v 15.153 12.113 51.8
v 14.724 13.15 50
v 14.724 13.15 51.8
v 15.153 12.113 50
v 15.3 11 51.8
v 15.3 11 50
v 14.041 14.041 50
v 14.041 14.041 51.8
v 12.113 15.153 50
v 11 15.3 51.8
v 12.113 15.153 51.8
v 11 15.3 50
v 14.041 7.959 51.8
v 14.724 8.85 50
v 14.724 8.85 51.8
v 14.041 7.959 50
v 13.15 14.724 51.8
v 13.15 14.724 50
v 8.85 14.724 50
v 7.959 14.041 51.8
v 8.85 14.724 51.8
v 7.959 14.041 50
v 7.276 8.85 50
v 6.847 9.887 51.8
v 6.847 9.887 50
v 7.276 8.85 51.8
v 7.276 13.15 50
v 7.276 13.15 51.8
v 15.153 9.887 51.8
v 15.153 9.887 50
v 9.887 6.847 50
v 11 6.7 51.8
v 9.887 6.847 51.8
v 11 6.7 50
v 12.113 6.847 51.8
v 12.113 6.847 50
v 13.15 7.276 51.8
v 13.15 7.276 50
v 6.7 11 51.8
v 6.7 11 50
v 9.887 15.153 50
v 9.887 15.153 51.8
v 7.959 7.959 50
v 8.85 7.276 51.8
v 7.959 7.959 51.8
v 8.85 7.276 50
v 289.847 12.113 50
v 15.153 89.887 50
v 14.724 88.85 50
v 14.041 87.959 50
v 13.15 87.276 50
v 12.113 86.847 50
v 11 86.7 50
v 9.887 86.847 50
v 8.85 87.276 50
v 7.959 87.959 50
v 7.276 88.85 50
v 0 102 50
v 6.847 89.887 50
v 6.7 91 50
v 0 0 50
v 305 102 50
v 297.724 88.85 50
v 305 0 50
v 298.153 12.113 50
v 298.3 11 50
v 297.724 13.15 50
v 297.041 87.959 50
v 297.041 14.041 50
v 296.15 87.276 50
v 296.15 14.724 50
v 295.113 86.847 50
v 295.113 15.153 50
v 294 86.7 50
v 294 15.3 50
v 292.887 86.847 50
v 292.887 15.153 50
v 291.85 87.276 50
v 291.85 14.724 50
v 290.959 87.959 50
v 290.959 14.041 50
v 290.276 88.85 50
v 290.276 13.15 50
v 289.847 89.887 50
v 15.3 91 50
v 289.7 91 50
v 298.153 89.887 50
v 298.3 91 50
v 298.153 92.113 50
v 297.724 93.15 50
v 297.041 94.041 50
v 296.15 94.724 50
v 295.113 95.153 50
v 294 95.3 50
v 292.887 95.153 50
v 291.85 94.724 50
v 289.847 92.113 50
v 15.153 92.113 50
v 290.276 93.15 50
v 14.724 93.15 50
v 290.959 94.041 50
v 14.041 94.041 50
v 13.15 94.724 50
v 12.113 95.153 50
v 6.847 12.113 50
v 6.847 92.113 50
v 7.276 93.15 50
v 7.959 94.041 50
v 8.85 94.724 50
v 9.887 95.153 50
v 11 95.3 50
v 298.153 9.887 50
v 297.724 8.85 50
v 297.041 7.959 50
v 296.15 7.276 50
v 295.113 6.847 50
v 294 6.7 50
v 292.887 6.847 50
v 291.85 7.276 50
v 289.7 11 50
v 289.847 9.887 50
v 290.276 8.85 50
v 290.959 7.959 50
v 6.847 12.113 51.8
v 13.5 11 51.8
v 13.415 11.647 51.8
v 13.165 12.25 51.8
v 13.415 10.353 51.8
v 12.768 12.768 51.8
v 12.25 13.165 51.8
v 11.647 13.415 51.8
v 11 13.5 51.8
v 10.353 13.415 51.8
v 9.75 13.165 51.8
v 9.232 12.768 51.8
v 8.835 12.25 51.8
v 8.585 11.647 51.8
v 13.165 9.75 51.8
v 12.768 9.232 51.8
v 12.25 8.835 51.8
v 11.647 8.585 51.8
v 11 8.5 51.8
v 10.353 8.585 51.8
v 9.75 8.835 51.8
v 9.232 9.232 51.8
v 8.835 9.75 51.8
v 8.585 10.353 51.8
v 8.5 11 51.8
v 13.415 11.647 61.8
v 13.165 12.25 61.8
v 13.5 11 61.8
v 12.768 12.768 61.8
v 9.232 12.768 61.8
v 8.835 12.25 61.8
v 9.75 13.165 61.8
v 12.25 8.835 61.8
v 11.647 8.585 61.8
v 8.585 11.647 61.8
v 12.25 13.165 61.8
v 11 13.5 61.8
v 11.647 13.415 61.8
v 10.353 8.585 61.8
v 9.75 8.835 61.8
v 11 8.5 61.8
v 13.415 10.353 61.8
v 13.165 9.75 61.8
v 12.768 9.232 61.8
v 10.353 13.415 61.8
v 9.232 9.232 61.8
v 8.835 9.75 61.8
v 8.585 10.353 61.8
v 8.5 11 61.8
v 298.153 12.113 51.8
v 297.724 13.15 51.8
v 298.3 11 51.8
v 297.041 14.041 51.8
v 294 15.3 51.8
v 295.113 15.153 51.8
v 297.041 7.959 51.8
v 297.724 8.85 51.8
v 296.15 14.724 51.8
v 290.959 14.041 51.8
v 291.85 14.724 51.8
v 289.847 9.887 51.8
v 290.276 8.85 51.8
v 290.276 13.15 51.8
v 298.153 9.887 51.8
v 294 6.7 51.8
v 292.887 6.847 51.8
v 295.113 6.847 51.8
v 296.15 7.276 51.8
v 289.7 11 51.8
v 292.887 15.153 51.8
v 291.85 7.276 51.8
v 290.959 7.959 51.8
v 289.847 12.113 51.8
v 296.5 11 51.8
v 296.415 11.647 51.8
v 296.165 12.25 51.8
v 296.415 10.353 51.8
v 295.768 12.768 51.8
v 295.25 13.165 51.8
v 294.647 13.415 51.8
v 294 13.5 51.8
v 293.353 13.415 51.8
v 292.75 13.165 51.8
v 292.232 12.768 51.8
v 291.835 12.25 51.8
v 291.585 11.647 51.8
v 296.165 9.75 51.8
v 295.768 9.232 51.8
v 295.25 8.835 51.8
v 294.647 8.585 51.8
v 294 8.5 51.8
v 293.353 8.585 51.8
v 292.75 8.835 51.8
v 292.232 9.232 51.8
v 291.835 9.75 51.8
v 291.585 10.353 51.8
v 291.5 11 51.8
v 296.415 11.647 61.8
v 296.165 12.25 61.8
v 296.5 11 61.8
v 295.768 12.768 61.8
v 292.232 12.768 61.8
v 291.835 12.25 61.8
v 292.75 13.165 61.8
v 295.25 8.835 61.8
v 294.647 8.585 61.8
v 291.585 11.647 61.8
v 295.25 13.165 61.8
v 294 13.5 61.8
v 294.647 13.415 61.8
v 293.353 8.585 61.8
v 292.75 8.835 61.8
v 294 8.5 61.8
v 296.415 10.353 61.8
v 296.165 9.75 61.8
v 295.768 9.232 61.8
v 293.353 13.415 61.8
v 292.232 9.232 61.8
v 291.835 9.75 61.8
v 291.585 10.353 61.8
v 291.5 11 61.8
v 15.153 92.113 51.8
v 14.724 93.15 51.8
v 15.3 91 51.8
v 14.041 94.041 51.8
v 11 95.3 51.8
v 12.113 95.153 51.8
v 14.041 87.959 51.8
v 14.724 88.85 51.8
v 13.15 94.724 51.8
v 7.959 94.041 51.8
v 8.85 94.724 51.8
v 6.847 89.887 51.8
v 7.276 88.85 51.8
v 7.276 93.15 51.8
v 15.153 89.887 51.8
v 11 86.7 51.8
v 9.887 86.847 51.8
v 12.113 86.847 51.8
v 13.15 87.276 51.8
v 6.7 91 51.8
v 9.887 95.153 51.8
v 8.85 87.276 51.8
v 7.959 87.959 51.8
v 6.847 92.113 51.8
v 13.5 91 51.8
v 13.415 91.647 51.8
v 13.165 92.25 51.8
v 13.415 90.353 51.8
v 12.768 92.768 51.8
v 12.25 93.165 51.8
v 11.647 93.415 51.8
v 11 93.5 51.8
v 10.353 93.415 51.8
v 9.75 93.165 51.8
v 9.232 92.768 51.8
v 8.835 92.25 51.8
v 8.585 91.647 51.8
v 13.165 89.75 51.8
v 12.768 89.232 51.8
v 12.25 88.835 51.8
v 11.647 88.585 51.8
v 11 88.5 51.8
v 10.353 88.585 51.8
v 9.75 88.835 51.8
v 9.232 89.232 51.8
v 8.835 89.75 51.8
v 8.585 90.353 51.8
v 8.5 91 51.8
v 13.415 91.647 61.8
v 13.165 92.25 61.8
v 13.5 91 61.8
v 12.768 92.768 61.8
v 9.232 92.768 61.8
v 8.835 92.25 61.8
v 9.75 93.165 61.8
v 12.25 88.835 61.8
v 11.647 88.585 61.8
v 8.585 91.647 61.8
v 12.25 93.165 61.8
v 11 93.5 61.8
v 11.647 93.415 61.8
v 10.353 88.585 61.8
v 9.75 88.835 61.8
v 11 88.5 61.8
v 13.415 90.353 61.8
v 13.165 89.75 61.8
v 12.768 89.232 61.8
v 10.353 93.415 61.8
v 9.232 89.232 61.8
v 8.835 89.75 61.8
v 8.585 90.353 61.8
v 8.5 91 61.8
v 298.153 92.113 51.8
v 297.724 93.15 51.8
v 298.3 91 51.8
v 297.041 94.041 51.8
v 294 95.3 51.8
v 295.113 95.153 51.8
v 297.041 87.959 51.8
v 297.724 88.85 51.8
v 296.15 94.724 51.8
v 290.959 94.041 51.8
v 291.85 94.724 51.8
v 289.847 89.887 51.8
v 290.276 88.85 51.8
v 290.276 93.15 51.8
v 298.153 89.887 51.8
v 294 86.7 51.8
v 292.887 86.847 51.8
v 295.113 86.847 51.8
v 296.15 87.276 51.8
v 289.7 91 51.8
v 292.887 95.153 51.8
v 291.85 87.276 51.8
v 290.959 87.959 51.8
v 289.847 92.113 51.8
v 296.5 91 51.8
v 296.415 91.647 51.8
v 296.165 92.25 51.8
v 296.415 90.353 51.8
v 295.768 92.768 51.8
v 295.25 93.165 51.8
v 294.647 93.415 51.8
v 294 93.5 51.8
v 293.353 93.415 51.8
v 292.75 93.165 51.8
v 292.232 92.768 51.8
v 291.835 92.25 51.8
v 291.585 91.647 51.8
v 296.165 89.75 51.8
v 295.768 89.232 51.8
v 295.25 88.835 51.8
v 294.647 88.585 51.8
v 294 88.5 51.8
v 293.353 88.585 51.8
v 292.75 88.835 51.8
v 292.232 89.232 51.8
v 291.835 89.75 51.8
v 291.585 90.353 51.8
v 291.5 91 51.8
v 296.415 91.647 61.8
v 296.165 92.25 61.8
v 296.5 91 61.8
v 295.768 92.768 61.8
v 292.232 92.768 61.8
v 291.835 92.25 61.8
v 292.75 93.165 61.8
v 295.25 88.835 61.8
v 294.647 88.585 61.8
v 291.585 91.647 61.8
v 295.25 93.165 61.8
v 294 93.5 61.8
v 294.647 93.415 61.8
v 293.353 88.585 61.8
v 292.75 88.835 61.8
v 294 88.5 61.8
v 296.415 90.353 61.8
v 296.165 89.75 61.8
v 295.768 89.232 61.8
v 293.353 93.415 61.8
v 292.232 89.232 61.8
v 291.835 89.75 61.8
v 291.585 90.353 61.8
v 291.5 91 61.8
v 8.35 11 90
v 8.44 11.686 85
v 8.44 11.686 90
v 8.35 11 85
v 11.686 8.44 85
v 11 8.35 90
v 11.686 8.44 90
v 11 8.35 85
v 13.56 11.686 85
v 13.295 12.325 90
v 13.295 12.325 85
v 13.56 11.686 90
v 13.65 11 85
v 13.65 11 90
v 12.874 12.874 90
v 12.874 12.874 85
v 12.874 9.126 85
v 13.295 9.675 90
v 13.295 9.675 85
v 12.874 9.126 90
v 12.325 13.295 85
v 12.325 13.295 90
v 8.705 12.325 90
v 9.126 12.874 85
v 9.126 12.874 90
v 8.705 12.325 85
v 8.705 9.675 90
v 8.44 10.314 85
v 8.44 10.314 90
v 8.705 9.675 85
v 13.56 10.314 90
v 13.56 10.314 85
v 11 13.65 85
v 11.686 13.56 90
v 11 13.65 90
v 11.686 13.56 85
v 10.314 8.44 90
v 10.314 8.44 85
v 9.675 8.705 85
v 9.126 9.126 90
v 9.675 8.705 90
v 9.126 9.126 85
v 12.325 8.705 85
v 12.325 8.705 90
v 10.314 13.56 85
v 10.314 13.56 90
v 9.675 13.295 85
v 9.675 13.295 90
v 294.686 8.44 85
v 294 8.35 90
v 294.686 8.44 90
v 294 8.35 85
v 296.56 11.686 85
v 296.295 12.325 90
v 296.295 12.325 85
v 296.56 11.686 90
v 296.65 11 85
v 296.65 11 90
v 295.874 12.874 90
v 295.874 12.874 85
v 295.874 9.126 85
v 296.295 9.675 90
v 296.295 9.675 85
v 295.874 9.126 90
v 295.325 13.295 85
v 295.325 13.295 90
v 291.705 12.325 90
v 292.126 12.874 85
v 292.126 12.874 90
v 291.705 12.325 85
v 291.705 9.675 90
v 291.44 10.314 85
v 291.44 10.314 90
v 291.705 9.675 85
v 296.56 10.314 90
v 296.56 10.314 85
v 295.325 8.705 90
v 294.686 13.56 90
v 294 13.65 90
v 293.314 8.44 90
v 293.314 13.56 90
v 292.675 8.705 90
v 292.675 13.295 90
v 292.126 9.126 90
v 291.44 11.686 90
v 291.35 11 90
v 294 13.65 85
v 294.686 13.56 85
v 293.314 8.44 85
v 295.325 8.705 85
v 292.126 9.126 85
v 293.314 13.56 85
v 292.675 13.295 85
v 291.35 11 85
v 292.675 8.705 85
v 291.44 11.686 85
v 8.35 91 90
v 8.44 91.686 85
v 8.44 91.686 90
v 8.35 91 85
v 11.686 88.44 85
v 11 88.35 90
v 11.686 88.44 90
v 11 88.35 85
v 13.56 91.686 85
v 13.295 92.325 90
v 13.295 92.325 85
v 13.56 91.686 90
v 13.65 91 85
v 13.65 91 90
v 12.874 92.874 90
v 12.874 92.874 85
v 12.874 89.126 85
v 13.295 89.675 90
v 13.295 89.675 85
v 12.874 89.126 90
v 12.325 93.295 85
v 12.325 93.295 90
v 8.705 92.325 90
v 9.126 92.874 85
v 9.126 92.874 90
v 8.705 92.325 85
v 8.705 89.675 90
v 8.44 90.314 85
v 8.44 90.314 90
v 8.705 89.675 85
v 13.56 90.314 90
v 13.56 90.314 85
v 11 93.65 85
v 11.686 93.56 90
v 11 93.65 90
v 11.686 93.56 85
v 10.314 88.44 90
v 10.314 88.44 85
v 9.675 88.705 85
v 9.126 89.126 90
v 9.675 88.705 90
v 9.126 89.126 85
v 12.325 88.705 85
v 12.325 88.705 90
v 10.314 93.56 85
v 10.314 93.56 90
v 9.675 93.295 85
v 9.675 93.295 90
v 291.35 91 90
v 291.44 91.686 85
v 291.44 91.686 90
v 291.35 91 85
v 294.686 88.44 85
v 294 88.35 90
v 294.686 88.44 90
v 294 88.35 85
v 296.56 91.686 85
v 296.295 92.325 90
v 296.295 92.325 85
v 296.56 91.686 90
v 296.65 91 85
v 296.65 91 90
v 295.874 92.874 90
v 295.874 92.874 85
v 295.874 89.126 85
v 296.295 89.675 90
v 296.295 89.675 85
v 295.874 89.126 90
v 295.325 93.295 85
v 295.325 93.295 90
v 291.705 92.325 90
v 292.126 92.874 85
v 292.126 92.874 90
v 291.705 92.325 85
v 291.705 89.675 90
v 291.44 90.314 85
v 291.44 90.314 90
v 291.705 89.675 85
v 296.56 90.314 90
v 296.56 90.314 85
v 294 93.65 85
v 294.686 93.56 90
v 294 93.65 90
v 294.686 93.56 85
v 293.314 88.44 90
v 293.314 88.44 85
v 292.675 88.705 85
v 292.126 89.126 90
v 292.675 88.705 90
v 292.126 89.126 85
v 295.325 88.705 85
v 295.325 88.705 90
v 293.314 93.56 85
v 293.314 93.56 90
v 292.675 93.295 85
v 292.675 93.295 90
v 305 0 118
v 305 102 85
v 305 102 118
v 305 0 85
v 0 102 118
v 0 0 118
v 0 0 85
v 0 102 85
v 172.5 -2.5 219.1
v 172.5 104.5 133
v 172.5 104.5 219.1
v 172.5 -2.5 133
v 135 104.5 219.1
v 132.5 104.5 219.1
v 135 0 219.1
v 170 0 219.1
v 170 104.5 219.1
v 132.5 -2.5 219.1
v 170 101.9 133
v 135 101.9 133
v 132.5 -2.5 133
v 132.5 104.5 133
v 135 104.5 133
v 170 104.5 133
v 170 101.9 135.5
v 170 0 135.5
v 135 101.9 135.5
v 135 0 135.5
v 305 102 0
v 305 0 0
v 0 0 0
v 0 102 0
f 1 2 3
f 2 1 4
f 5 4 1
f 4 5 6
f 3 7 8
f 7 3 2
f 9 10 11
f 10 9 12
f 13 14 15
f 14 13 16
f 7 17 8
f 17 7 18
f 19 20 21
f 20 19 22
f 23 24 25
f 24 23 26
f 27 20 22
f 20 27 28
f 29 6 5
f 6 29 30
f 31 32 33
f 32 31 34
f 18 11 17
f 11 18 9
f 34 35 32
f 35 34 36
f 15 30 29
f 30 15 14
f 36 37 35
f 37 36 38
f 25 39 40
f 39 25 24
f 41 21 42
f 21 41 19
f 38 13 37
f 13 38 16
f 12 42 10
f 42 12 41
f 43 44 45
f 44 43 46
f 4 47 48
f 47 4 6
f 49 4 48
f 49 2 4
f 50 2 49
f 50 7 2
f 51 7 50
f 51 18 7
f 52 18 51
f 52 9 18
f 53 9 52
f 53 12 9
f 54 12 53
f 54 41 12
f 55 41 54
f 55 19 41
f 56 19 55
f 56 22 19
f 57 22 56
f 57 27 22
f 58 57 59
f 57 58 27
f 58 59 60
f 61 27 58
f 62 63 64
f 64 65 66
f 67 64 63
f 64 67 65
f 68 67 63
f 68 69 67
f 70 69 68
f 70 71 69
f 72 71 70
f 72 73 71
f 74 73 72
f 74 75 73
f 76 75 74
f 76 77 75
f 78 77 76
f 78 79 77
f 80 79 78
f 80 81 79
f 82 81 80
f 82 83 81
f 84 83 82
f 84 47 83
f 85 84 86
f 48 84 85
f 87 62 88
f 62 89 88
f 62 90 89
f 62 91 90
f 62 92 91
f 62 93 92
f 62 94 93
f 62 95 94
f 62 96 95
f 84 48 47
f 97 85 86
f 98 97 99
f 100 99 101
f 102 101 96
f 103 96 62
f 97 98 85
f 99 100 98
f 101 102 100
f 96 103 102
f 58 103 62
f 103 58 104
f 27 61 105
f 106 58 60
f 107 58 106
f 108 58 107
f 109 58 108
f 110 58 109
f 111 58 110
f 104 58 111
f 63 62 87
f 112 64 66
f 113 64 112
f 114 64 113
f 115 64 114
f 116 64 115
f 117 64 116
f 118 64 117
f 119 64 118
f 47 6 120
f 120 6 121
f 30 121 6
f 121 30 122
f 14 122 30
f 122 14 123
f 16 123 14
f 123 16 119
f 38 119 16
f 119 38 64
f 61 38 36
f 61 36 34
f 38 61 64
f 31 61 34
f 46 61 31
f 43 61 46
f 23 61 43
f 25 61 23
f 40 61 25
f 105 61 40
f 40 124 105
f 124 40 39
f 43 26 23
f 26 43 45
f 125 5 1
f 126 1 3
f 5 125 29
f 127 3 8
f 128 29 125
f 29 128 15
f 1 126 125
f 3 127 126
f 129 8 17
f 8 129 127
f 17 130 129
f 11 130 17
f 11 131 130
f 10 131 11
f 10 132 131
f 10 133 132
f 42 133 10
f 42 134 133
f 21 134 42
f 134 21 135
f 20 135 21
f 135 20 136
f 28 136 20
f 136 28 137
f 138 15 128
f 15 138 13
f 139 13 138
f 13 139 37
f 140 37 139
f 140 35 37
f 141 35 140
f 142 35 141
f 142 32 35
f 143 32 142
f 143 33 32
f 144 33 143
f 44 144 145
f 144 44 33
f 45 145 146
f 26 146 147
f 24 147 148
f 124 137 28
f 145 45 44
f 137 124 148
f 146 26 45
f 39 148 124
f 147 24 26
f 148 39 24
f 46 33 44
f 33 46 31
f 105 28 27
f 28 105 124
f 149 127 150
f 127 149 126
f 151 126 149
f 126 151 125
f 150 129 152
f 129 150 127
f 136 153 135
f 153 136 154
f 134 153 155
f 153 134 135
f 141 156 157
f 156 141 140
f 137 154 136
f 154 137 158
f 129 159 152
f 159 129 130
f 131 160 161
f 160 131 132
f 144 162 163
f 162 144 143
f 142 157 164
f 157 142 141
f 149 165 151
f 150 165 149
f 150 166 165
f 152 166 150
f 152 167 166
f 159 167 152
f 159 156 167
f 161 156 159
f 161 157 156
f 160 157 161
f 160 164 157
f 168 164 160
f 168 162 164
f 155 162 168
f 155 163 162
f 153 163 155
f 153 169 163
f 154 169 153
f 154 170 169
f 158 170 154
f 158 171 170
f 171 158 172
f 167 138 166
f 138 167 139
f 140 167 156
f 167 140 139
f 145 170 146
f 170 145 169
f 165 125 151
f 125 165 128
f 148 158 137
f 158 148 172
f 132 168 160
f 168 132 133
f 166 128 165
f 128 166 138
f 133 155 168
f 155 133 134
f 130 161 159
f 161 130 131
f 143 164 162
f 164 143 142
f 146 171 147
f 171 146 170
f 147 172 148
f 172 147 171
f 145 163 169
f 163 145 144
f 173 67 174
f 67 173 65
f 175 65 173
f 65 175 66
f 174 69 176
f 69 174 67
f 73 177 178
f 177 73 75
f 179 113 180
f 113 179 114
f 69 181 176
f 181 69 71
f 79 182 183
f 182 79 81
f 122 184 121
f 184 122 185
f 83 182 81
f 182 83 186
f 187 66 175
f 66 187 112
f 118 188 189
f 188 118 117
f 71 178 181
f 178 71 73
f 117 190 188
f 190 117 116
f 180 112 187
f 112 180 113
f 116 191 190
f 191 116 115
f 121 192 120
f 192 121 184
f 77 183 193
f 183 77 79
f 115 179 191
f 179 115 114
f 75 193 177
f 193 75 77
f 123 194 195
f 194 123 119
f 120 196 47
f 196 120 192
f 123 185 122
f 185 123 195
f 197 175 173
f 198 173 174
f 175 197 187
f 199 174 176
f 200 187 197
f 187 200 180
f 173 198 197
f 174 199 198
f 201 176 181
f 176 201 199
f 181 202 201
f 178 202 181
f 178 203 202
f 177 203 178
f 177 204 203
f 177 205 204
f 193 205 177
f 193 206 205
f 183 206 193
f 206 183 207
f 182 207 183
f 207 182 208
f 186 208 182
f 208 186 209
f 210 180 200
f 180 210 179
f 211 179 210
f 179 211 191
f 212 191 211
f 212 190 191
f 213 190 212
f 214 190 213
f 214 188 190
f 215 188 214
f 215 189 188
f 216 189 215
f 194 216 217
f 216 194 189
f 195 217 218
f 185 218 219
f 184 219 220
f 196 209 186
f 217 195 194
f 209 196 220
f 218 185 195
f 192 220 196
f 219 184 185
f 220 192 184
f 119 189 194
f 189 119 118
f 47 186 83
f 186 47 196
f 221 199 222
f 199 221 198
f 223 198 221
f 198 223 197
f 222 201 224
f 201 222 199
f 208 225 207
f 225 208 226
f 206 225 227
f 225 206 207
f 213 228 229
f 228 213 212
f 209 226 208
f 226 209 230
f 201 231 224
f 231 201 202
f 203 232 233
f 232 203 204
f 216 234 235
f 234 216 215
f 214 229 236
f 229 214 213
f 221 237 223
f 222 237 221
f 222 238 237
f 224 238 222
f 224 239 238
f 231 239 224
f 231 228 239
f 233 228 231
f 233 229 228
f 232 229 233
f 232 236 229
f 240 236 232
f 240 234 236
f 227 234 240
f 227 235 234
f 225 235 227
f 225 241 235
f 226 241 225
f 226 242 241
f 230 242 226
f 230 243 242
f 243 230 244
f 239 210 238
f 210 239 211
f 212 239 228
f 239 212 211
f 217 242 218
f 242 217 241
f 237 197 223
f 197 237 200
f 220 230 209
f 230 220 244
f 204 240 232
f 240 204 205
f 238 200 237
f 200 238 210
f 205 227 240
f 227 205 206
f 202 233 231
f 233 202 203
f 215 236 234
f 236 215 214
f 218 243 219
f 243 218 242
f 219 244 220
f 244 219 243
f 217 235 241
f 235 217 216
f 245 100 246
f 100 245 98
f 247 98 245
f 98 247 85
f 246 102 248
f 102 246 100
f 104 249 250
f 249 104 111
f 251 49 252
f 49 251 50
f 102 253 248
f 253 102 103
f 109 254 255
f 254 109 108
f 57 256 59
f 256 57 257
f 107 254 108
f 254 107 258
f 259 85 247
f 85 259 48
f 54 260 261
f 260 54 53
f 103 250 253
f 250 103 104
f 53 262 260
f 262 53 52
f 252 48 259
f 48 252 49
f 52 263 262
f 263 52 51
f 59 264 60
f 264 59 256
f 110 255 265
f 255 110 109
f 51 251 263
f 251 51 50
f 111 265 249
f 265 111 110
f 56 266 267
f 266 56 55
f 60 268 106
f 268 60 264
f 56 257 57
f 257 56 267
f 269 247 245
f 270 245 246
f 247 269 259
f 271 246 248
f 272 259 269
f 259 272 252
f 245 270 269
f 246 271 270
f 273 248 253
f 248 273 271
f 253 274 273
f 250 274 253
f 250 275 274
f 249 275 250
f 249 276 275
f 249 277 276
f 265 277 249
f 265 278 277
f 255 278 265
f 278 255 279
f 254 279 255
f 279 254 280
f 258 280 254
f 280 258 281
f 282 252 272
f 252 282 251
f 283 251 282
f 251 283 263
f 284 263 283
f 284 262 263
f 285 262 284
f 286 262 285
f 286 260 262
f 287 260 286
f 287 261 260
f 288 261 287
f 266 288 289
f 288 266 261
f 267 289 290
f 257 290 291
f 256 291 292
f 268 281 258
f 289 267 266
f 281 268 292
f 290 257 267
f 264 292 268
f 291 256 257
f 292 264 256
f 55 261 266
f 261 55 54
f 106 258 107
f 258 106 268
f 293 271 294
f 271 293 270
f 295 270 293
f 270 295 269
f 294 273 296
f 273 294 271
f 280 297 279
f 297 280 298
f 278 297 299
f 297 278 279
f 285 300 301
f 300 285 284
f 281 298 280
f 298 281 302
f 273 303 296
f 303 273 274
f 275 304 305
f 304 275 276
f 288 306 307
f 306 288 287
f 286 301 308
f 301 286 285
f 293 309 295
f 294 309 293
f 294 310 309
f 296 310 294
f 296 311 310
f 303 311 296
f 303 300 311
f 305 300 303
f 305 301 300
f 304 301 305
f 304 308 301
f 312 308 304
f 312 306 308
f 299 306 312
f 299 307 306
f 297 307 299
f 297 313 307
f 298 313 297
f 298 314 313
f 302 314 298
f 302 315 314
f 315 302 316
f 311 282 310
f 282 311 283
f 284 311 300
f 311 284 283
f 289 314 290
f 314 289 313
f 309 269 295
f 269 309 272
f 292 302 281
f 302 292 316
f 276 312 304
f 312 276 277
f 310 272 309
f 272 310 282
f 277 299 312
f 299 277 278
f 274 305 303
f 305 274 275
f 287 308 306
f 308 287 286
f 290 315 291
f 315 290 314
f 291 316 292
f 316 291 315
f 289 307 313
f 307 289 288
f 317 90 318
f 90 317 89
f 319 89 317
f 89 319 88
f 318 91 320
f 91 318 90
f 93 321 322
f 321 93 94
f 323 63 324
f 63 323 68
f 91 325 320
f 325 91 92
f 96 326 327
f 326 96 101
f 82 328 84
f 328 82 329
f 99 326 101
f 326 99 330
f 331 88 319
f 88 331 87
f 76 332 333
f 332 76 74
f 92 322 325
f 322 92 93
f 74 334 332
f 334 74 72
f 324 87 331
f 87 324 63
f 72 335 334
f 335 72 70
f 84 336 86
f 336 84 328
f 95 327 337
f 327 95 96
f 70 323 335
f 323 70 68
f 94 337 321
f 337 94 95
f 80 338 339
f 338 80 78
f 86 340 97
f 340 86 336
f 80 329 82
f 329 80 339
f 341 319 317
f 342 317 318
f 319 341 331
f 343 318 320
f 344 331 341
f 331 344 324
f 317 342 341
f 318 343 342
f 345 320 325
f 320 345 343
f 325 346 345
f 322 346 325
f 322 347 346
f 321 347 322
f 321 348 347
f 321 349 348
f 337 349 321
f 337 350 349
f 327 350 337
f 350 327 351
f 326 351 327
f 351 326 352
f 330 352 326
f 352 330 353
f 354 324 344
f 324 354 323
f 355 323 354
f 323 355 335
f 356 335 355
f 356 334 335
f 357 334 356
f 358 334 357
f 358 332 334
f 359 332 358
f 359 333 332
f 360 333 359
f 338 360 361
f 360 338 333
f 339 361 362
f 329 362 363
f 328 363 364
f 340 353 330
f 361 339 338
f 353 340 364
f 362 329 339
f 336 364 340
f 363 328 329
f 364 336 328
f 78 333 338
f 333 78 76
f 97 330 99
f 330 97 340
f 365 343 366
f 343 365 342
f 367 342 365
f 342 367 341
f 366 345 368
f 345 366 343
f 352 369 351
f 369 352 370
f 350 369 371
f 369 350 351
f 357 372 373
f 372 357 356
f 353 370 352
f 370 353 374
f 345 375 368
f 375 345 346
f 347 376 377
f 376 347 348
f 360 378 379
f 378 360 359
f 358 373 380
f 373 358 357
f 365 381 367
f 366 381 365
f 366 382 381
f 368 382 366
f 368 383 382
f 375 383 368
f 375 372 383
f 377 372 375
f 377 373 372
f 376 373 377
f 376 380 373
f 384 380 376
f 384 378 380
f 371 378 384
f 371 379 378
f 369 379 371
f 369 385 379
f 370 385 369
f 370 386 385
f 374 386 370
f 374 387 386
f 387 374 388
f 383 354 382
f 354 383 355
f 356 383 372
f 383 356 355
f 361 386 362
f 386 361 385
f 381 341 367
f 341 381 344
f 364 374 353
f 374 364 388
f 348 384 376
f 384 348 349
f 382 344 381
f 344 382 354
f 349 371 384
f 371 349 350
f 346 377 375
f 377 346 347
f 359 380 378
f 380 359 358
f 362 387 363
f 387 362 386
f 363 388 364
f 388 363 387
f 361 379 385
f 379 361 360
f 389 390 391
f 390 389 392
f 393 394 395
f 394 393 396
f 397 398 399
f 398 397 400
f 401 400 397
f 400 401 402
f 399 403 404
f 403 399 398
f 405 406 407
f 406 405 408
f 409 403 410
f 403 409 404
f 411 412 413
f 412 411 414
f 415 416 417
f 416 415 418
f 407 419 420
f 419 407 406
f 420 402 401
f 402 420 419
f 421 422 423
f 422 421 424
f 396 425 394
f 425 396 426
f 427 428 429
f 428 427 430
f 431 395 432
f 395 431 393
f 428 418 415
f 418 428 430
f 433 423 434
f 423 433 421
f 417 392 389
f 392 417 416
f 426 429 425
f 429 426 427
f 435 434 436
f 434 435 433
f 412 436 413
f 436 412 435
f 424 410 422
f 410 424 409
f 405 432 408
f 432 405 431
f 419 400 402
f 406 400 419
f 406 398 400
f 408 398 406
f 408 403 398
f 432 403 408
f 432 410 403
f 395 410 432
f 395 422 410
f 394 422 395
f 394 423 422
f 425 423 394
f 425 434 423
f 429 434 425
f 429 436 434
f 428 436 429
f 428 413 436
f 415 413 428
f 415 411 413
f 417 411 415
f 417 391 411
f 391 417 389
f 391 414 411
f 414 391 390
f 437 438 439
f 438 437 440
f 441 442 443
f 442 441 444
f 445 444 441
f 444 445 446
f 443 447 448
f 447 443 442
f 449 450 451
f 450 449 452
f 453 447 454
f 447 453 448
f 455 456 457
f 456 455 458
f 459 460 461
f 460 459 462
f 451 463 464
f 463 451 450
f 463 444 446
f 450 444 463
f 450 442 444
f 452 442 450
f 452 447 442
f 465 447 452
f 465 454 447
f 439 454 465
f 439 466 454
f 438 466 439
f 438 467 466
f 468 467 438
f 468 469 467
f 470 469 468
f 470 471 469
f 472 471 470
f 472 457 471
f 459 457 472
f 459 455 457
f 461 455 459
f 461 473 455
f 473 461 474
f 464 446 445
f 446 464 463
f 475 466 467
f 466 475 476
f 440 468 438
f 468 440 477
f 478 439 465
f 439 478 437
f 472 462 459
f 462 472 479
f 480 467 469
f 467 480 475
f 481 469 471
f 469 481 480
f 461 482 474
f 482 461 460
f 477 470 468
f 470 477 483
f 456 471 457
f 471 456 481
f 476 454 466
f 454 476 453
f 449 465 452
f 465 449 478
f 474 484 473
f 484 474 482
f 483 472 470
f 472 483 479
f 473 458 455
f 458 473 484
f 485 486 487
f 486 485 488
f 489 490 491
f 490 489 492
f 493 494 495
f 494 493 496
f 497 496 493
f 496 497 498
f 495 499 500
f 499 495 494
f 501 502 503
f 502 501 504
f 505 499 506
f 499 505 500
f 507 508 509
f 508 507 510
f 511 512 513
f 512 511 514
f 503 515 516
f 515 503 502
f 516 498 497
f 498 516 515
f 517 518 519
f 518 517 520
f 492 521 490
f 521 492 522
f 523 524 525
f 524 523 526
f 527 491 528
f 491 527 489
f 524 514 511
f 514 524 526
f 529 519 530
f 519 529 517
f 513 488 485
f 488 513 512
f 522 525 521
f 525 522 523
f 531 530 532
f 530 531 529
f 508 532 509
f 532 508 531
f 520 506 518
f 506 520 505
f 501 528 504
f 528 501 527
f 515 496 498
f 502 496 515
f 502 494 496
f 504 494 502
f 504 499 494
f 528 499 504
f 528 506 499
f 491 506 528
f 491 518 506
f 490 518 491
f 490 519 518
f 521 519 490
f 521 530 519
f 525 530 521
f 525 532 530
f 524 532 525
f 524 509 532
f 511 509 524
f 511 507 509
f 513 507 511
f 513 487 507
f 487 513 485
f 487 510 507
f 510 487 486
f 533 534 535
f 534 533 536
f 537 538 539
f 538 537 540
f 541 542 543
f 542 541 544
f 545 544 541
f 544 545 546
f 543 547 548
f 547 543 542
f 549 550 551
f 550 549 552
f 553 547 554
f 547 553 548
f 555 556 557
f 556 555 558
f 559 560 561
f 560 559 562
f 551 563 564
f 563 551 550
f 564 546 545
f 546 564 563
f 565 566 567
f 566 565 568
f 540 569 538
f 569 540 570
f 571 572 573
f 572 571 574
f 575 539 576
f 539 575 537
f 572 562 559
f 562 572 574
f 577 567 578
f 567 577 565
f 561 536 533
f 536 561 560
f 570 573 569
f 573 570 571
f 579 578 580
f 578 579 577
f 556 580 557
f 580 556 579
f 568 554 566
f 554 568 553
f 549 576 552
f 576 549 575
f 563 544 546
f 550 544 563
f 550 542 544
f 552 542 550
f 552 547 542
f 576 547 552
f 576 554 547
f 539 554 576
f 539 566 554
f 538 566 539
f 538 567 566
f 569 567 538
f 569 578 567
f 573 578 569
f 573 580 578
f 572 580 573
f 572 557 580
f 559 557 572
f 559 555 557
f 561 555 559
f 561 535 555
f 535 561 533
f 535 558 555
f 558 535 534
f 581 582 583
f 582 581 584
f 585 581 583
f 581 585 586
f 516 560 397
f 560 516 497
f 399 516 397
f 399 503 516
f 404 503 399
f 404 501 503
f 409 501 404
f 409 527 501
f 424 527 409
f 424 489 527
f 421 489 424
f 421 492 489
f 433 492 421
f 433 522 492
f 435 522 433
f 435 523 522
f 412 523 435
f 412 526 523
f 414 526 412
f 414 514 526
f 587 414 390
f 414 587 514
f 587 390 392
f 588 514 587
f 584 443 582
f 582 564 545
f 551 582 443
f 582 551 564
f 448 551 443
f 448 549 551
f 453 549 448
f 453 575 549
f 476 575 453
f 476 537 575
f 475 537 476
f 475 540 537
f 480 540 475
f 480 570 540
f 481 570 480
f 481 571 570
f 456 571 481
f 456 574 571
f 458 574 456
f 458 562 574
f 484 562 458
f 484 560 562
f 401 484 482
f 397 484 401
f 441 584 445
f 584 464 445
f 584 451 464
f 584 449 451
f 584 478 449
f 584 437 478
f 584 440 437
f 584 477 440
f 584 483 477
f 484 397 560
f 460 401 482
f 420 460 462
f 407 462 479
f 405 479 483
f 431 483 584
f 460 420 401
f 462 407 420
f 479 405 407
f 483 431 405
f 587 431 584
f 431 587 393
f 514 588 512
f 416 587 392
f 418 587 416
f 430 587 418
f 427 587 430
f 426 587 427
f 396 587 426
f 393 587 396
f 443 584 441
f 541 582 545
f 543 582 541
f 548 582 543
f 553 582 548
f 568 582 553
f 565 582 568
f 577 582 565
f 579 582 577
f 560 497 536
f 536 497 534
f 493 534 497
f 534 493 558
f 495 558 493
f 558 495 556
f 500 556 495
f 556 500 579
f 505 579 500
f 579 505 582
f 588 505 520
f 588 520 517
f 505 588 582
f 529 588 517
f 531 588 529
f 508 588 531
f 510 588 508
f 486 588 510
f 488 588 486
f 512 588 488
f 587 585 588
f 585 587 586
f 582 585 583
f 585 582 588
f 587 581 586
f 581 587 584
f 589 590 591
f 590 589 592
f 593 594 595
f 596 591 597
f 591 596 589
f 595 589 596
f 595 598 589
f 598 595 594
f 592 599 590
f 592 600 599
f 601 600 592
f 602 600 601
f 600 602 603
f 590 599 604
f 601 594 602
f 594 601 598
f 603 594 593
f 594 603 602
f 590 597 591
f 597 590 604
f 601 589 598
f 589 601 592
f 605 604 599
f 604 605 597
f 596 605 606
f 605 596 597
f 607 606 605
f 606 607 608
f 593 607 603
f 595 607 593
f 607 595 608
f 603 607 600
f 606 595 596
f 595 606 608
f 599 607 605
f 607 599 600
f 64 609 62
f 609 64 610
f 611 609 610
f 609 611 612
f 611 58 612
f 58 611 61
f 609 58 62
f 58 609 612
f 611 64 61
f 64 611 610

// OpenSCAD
// 02_locating_pins_cotter_clip.scad
// Four locating pins on lower tray corners + a separate U-shaped cotter clip
// that slides over both trays on the long side to pin them together.
// Engage: set upper on pins, slide clip down. Release: slide clip up & off.

explode = 35; // 0=engaged, 35=exploded

lx=305; ly=102; lz=50;
ux=305; uy=102; uz=33;
wall=3;

pin_d   = 5;   // locating pin diameter
pin_h   = 10;  // pin protrusion above lower tray top
hole_cl = 0.3; // clearance for pin holes

clip_t  = 2.5; // clip wall thickness
clip_gap= lz+uz+0.6; // slot height (total stack height + clearance)
clip_len= 40;  // clip length along X
clip_w  = ly + clip_t*2; // clip spans full Y

module lower_tray() { color("SteelBlue",0.85) cube([lx,ly,lz]); }
module upper_tray() { color("LightSkyBlue",0.85) cube([ux,uy,uz]); }

// Pin boss on lower tray top face
module pin_boss(d, h) {
    boss_d = d + wall*1.2;
    color("DarkOrange",0.9) {
        cylinder(d=boss_d, h=wall*0.6, $fn=24);
        cylinder(d=d, h=h+wall*0.6, $fn=24);
    }
}

// Pin socket recess in upper tray bottom
module pin_socket(d, h) {
    cylinder(d=d+hole_cl, h=h+1, $fn=24);
}

// U-clip: spans the long side of the stack
module u_clip(engaged) {
    // clip sits flush against one long face (Y=0 side)
    // U opens in +Y direction; legs grip the outer long faces
    color("Orange", 0.92)
    difference() {
        // outer block
        cube([clip_len, clip_t + ly + clip_t, clip_gap + clip_t]);
        // inner cutout — the slot the two trays fit into
        translate([clip_t, clip_t, clip_t])
            cube([clip_len - clip_t*2, ly, clip_gap + 0.1]);
        // open the front (entry side)
        translate([clip_t, clip_t + ly - 0.1, 0])
            cube([clip_len - clip_t*2, clip_t + 1, clip_gap + clip_t + 0.1]);
        // chamfer entry on clip top
        translate([clip_t, clip_t*2, clip_gap + clip_t - clip_t*0.8])
            rotate([-45,0,0])
                cube([clip_len-clip_t*2, clip_t*2, clip_t*2]);
    }
}

// --- Assemble lower tray ---
lower_tray();

// Four pins on lower tray: near each corner, inset from edge
pin_positions = [
    [wall*2 + pin_d, wall*2 + pin_d],
    [lx - wall*2 - pin_d, wall*2 + pin_d],
    [wall*2 + pin_d, ly - wall*2 - pin_d],
    [lx - wall*2 - pin_d, ly - wall*2 - pin_d]
];

for(p = pin_positions)
    translate([p[0], p[1], lz])
        pin_boss(pin_d, pin_h);

// --- Upper tray with pin sockets ---
translate([0, 0, lz + explode])
difference() {
    upper_tray();
    for(p = pin_positions)
        translate([p[0], p[1], -pin_h])
            pin_socket(pin_d, pin_h + wall + 1);
}

// --- U-clip, placed on the long side ---
clip_x_offset = lx/2 - clip_len/2;
clip_z_offset = explode > 0 ? lz + uz + explode + 15 : 0;

translate([clip_x_offset, -clip_t, clip_z_offset])
    u_clip(explode == 0);
